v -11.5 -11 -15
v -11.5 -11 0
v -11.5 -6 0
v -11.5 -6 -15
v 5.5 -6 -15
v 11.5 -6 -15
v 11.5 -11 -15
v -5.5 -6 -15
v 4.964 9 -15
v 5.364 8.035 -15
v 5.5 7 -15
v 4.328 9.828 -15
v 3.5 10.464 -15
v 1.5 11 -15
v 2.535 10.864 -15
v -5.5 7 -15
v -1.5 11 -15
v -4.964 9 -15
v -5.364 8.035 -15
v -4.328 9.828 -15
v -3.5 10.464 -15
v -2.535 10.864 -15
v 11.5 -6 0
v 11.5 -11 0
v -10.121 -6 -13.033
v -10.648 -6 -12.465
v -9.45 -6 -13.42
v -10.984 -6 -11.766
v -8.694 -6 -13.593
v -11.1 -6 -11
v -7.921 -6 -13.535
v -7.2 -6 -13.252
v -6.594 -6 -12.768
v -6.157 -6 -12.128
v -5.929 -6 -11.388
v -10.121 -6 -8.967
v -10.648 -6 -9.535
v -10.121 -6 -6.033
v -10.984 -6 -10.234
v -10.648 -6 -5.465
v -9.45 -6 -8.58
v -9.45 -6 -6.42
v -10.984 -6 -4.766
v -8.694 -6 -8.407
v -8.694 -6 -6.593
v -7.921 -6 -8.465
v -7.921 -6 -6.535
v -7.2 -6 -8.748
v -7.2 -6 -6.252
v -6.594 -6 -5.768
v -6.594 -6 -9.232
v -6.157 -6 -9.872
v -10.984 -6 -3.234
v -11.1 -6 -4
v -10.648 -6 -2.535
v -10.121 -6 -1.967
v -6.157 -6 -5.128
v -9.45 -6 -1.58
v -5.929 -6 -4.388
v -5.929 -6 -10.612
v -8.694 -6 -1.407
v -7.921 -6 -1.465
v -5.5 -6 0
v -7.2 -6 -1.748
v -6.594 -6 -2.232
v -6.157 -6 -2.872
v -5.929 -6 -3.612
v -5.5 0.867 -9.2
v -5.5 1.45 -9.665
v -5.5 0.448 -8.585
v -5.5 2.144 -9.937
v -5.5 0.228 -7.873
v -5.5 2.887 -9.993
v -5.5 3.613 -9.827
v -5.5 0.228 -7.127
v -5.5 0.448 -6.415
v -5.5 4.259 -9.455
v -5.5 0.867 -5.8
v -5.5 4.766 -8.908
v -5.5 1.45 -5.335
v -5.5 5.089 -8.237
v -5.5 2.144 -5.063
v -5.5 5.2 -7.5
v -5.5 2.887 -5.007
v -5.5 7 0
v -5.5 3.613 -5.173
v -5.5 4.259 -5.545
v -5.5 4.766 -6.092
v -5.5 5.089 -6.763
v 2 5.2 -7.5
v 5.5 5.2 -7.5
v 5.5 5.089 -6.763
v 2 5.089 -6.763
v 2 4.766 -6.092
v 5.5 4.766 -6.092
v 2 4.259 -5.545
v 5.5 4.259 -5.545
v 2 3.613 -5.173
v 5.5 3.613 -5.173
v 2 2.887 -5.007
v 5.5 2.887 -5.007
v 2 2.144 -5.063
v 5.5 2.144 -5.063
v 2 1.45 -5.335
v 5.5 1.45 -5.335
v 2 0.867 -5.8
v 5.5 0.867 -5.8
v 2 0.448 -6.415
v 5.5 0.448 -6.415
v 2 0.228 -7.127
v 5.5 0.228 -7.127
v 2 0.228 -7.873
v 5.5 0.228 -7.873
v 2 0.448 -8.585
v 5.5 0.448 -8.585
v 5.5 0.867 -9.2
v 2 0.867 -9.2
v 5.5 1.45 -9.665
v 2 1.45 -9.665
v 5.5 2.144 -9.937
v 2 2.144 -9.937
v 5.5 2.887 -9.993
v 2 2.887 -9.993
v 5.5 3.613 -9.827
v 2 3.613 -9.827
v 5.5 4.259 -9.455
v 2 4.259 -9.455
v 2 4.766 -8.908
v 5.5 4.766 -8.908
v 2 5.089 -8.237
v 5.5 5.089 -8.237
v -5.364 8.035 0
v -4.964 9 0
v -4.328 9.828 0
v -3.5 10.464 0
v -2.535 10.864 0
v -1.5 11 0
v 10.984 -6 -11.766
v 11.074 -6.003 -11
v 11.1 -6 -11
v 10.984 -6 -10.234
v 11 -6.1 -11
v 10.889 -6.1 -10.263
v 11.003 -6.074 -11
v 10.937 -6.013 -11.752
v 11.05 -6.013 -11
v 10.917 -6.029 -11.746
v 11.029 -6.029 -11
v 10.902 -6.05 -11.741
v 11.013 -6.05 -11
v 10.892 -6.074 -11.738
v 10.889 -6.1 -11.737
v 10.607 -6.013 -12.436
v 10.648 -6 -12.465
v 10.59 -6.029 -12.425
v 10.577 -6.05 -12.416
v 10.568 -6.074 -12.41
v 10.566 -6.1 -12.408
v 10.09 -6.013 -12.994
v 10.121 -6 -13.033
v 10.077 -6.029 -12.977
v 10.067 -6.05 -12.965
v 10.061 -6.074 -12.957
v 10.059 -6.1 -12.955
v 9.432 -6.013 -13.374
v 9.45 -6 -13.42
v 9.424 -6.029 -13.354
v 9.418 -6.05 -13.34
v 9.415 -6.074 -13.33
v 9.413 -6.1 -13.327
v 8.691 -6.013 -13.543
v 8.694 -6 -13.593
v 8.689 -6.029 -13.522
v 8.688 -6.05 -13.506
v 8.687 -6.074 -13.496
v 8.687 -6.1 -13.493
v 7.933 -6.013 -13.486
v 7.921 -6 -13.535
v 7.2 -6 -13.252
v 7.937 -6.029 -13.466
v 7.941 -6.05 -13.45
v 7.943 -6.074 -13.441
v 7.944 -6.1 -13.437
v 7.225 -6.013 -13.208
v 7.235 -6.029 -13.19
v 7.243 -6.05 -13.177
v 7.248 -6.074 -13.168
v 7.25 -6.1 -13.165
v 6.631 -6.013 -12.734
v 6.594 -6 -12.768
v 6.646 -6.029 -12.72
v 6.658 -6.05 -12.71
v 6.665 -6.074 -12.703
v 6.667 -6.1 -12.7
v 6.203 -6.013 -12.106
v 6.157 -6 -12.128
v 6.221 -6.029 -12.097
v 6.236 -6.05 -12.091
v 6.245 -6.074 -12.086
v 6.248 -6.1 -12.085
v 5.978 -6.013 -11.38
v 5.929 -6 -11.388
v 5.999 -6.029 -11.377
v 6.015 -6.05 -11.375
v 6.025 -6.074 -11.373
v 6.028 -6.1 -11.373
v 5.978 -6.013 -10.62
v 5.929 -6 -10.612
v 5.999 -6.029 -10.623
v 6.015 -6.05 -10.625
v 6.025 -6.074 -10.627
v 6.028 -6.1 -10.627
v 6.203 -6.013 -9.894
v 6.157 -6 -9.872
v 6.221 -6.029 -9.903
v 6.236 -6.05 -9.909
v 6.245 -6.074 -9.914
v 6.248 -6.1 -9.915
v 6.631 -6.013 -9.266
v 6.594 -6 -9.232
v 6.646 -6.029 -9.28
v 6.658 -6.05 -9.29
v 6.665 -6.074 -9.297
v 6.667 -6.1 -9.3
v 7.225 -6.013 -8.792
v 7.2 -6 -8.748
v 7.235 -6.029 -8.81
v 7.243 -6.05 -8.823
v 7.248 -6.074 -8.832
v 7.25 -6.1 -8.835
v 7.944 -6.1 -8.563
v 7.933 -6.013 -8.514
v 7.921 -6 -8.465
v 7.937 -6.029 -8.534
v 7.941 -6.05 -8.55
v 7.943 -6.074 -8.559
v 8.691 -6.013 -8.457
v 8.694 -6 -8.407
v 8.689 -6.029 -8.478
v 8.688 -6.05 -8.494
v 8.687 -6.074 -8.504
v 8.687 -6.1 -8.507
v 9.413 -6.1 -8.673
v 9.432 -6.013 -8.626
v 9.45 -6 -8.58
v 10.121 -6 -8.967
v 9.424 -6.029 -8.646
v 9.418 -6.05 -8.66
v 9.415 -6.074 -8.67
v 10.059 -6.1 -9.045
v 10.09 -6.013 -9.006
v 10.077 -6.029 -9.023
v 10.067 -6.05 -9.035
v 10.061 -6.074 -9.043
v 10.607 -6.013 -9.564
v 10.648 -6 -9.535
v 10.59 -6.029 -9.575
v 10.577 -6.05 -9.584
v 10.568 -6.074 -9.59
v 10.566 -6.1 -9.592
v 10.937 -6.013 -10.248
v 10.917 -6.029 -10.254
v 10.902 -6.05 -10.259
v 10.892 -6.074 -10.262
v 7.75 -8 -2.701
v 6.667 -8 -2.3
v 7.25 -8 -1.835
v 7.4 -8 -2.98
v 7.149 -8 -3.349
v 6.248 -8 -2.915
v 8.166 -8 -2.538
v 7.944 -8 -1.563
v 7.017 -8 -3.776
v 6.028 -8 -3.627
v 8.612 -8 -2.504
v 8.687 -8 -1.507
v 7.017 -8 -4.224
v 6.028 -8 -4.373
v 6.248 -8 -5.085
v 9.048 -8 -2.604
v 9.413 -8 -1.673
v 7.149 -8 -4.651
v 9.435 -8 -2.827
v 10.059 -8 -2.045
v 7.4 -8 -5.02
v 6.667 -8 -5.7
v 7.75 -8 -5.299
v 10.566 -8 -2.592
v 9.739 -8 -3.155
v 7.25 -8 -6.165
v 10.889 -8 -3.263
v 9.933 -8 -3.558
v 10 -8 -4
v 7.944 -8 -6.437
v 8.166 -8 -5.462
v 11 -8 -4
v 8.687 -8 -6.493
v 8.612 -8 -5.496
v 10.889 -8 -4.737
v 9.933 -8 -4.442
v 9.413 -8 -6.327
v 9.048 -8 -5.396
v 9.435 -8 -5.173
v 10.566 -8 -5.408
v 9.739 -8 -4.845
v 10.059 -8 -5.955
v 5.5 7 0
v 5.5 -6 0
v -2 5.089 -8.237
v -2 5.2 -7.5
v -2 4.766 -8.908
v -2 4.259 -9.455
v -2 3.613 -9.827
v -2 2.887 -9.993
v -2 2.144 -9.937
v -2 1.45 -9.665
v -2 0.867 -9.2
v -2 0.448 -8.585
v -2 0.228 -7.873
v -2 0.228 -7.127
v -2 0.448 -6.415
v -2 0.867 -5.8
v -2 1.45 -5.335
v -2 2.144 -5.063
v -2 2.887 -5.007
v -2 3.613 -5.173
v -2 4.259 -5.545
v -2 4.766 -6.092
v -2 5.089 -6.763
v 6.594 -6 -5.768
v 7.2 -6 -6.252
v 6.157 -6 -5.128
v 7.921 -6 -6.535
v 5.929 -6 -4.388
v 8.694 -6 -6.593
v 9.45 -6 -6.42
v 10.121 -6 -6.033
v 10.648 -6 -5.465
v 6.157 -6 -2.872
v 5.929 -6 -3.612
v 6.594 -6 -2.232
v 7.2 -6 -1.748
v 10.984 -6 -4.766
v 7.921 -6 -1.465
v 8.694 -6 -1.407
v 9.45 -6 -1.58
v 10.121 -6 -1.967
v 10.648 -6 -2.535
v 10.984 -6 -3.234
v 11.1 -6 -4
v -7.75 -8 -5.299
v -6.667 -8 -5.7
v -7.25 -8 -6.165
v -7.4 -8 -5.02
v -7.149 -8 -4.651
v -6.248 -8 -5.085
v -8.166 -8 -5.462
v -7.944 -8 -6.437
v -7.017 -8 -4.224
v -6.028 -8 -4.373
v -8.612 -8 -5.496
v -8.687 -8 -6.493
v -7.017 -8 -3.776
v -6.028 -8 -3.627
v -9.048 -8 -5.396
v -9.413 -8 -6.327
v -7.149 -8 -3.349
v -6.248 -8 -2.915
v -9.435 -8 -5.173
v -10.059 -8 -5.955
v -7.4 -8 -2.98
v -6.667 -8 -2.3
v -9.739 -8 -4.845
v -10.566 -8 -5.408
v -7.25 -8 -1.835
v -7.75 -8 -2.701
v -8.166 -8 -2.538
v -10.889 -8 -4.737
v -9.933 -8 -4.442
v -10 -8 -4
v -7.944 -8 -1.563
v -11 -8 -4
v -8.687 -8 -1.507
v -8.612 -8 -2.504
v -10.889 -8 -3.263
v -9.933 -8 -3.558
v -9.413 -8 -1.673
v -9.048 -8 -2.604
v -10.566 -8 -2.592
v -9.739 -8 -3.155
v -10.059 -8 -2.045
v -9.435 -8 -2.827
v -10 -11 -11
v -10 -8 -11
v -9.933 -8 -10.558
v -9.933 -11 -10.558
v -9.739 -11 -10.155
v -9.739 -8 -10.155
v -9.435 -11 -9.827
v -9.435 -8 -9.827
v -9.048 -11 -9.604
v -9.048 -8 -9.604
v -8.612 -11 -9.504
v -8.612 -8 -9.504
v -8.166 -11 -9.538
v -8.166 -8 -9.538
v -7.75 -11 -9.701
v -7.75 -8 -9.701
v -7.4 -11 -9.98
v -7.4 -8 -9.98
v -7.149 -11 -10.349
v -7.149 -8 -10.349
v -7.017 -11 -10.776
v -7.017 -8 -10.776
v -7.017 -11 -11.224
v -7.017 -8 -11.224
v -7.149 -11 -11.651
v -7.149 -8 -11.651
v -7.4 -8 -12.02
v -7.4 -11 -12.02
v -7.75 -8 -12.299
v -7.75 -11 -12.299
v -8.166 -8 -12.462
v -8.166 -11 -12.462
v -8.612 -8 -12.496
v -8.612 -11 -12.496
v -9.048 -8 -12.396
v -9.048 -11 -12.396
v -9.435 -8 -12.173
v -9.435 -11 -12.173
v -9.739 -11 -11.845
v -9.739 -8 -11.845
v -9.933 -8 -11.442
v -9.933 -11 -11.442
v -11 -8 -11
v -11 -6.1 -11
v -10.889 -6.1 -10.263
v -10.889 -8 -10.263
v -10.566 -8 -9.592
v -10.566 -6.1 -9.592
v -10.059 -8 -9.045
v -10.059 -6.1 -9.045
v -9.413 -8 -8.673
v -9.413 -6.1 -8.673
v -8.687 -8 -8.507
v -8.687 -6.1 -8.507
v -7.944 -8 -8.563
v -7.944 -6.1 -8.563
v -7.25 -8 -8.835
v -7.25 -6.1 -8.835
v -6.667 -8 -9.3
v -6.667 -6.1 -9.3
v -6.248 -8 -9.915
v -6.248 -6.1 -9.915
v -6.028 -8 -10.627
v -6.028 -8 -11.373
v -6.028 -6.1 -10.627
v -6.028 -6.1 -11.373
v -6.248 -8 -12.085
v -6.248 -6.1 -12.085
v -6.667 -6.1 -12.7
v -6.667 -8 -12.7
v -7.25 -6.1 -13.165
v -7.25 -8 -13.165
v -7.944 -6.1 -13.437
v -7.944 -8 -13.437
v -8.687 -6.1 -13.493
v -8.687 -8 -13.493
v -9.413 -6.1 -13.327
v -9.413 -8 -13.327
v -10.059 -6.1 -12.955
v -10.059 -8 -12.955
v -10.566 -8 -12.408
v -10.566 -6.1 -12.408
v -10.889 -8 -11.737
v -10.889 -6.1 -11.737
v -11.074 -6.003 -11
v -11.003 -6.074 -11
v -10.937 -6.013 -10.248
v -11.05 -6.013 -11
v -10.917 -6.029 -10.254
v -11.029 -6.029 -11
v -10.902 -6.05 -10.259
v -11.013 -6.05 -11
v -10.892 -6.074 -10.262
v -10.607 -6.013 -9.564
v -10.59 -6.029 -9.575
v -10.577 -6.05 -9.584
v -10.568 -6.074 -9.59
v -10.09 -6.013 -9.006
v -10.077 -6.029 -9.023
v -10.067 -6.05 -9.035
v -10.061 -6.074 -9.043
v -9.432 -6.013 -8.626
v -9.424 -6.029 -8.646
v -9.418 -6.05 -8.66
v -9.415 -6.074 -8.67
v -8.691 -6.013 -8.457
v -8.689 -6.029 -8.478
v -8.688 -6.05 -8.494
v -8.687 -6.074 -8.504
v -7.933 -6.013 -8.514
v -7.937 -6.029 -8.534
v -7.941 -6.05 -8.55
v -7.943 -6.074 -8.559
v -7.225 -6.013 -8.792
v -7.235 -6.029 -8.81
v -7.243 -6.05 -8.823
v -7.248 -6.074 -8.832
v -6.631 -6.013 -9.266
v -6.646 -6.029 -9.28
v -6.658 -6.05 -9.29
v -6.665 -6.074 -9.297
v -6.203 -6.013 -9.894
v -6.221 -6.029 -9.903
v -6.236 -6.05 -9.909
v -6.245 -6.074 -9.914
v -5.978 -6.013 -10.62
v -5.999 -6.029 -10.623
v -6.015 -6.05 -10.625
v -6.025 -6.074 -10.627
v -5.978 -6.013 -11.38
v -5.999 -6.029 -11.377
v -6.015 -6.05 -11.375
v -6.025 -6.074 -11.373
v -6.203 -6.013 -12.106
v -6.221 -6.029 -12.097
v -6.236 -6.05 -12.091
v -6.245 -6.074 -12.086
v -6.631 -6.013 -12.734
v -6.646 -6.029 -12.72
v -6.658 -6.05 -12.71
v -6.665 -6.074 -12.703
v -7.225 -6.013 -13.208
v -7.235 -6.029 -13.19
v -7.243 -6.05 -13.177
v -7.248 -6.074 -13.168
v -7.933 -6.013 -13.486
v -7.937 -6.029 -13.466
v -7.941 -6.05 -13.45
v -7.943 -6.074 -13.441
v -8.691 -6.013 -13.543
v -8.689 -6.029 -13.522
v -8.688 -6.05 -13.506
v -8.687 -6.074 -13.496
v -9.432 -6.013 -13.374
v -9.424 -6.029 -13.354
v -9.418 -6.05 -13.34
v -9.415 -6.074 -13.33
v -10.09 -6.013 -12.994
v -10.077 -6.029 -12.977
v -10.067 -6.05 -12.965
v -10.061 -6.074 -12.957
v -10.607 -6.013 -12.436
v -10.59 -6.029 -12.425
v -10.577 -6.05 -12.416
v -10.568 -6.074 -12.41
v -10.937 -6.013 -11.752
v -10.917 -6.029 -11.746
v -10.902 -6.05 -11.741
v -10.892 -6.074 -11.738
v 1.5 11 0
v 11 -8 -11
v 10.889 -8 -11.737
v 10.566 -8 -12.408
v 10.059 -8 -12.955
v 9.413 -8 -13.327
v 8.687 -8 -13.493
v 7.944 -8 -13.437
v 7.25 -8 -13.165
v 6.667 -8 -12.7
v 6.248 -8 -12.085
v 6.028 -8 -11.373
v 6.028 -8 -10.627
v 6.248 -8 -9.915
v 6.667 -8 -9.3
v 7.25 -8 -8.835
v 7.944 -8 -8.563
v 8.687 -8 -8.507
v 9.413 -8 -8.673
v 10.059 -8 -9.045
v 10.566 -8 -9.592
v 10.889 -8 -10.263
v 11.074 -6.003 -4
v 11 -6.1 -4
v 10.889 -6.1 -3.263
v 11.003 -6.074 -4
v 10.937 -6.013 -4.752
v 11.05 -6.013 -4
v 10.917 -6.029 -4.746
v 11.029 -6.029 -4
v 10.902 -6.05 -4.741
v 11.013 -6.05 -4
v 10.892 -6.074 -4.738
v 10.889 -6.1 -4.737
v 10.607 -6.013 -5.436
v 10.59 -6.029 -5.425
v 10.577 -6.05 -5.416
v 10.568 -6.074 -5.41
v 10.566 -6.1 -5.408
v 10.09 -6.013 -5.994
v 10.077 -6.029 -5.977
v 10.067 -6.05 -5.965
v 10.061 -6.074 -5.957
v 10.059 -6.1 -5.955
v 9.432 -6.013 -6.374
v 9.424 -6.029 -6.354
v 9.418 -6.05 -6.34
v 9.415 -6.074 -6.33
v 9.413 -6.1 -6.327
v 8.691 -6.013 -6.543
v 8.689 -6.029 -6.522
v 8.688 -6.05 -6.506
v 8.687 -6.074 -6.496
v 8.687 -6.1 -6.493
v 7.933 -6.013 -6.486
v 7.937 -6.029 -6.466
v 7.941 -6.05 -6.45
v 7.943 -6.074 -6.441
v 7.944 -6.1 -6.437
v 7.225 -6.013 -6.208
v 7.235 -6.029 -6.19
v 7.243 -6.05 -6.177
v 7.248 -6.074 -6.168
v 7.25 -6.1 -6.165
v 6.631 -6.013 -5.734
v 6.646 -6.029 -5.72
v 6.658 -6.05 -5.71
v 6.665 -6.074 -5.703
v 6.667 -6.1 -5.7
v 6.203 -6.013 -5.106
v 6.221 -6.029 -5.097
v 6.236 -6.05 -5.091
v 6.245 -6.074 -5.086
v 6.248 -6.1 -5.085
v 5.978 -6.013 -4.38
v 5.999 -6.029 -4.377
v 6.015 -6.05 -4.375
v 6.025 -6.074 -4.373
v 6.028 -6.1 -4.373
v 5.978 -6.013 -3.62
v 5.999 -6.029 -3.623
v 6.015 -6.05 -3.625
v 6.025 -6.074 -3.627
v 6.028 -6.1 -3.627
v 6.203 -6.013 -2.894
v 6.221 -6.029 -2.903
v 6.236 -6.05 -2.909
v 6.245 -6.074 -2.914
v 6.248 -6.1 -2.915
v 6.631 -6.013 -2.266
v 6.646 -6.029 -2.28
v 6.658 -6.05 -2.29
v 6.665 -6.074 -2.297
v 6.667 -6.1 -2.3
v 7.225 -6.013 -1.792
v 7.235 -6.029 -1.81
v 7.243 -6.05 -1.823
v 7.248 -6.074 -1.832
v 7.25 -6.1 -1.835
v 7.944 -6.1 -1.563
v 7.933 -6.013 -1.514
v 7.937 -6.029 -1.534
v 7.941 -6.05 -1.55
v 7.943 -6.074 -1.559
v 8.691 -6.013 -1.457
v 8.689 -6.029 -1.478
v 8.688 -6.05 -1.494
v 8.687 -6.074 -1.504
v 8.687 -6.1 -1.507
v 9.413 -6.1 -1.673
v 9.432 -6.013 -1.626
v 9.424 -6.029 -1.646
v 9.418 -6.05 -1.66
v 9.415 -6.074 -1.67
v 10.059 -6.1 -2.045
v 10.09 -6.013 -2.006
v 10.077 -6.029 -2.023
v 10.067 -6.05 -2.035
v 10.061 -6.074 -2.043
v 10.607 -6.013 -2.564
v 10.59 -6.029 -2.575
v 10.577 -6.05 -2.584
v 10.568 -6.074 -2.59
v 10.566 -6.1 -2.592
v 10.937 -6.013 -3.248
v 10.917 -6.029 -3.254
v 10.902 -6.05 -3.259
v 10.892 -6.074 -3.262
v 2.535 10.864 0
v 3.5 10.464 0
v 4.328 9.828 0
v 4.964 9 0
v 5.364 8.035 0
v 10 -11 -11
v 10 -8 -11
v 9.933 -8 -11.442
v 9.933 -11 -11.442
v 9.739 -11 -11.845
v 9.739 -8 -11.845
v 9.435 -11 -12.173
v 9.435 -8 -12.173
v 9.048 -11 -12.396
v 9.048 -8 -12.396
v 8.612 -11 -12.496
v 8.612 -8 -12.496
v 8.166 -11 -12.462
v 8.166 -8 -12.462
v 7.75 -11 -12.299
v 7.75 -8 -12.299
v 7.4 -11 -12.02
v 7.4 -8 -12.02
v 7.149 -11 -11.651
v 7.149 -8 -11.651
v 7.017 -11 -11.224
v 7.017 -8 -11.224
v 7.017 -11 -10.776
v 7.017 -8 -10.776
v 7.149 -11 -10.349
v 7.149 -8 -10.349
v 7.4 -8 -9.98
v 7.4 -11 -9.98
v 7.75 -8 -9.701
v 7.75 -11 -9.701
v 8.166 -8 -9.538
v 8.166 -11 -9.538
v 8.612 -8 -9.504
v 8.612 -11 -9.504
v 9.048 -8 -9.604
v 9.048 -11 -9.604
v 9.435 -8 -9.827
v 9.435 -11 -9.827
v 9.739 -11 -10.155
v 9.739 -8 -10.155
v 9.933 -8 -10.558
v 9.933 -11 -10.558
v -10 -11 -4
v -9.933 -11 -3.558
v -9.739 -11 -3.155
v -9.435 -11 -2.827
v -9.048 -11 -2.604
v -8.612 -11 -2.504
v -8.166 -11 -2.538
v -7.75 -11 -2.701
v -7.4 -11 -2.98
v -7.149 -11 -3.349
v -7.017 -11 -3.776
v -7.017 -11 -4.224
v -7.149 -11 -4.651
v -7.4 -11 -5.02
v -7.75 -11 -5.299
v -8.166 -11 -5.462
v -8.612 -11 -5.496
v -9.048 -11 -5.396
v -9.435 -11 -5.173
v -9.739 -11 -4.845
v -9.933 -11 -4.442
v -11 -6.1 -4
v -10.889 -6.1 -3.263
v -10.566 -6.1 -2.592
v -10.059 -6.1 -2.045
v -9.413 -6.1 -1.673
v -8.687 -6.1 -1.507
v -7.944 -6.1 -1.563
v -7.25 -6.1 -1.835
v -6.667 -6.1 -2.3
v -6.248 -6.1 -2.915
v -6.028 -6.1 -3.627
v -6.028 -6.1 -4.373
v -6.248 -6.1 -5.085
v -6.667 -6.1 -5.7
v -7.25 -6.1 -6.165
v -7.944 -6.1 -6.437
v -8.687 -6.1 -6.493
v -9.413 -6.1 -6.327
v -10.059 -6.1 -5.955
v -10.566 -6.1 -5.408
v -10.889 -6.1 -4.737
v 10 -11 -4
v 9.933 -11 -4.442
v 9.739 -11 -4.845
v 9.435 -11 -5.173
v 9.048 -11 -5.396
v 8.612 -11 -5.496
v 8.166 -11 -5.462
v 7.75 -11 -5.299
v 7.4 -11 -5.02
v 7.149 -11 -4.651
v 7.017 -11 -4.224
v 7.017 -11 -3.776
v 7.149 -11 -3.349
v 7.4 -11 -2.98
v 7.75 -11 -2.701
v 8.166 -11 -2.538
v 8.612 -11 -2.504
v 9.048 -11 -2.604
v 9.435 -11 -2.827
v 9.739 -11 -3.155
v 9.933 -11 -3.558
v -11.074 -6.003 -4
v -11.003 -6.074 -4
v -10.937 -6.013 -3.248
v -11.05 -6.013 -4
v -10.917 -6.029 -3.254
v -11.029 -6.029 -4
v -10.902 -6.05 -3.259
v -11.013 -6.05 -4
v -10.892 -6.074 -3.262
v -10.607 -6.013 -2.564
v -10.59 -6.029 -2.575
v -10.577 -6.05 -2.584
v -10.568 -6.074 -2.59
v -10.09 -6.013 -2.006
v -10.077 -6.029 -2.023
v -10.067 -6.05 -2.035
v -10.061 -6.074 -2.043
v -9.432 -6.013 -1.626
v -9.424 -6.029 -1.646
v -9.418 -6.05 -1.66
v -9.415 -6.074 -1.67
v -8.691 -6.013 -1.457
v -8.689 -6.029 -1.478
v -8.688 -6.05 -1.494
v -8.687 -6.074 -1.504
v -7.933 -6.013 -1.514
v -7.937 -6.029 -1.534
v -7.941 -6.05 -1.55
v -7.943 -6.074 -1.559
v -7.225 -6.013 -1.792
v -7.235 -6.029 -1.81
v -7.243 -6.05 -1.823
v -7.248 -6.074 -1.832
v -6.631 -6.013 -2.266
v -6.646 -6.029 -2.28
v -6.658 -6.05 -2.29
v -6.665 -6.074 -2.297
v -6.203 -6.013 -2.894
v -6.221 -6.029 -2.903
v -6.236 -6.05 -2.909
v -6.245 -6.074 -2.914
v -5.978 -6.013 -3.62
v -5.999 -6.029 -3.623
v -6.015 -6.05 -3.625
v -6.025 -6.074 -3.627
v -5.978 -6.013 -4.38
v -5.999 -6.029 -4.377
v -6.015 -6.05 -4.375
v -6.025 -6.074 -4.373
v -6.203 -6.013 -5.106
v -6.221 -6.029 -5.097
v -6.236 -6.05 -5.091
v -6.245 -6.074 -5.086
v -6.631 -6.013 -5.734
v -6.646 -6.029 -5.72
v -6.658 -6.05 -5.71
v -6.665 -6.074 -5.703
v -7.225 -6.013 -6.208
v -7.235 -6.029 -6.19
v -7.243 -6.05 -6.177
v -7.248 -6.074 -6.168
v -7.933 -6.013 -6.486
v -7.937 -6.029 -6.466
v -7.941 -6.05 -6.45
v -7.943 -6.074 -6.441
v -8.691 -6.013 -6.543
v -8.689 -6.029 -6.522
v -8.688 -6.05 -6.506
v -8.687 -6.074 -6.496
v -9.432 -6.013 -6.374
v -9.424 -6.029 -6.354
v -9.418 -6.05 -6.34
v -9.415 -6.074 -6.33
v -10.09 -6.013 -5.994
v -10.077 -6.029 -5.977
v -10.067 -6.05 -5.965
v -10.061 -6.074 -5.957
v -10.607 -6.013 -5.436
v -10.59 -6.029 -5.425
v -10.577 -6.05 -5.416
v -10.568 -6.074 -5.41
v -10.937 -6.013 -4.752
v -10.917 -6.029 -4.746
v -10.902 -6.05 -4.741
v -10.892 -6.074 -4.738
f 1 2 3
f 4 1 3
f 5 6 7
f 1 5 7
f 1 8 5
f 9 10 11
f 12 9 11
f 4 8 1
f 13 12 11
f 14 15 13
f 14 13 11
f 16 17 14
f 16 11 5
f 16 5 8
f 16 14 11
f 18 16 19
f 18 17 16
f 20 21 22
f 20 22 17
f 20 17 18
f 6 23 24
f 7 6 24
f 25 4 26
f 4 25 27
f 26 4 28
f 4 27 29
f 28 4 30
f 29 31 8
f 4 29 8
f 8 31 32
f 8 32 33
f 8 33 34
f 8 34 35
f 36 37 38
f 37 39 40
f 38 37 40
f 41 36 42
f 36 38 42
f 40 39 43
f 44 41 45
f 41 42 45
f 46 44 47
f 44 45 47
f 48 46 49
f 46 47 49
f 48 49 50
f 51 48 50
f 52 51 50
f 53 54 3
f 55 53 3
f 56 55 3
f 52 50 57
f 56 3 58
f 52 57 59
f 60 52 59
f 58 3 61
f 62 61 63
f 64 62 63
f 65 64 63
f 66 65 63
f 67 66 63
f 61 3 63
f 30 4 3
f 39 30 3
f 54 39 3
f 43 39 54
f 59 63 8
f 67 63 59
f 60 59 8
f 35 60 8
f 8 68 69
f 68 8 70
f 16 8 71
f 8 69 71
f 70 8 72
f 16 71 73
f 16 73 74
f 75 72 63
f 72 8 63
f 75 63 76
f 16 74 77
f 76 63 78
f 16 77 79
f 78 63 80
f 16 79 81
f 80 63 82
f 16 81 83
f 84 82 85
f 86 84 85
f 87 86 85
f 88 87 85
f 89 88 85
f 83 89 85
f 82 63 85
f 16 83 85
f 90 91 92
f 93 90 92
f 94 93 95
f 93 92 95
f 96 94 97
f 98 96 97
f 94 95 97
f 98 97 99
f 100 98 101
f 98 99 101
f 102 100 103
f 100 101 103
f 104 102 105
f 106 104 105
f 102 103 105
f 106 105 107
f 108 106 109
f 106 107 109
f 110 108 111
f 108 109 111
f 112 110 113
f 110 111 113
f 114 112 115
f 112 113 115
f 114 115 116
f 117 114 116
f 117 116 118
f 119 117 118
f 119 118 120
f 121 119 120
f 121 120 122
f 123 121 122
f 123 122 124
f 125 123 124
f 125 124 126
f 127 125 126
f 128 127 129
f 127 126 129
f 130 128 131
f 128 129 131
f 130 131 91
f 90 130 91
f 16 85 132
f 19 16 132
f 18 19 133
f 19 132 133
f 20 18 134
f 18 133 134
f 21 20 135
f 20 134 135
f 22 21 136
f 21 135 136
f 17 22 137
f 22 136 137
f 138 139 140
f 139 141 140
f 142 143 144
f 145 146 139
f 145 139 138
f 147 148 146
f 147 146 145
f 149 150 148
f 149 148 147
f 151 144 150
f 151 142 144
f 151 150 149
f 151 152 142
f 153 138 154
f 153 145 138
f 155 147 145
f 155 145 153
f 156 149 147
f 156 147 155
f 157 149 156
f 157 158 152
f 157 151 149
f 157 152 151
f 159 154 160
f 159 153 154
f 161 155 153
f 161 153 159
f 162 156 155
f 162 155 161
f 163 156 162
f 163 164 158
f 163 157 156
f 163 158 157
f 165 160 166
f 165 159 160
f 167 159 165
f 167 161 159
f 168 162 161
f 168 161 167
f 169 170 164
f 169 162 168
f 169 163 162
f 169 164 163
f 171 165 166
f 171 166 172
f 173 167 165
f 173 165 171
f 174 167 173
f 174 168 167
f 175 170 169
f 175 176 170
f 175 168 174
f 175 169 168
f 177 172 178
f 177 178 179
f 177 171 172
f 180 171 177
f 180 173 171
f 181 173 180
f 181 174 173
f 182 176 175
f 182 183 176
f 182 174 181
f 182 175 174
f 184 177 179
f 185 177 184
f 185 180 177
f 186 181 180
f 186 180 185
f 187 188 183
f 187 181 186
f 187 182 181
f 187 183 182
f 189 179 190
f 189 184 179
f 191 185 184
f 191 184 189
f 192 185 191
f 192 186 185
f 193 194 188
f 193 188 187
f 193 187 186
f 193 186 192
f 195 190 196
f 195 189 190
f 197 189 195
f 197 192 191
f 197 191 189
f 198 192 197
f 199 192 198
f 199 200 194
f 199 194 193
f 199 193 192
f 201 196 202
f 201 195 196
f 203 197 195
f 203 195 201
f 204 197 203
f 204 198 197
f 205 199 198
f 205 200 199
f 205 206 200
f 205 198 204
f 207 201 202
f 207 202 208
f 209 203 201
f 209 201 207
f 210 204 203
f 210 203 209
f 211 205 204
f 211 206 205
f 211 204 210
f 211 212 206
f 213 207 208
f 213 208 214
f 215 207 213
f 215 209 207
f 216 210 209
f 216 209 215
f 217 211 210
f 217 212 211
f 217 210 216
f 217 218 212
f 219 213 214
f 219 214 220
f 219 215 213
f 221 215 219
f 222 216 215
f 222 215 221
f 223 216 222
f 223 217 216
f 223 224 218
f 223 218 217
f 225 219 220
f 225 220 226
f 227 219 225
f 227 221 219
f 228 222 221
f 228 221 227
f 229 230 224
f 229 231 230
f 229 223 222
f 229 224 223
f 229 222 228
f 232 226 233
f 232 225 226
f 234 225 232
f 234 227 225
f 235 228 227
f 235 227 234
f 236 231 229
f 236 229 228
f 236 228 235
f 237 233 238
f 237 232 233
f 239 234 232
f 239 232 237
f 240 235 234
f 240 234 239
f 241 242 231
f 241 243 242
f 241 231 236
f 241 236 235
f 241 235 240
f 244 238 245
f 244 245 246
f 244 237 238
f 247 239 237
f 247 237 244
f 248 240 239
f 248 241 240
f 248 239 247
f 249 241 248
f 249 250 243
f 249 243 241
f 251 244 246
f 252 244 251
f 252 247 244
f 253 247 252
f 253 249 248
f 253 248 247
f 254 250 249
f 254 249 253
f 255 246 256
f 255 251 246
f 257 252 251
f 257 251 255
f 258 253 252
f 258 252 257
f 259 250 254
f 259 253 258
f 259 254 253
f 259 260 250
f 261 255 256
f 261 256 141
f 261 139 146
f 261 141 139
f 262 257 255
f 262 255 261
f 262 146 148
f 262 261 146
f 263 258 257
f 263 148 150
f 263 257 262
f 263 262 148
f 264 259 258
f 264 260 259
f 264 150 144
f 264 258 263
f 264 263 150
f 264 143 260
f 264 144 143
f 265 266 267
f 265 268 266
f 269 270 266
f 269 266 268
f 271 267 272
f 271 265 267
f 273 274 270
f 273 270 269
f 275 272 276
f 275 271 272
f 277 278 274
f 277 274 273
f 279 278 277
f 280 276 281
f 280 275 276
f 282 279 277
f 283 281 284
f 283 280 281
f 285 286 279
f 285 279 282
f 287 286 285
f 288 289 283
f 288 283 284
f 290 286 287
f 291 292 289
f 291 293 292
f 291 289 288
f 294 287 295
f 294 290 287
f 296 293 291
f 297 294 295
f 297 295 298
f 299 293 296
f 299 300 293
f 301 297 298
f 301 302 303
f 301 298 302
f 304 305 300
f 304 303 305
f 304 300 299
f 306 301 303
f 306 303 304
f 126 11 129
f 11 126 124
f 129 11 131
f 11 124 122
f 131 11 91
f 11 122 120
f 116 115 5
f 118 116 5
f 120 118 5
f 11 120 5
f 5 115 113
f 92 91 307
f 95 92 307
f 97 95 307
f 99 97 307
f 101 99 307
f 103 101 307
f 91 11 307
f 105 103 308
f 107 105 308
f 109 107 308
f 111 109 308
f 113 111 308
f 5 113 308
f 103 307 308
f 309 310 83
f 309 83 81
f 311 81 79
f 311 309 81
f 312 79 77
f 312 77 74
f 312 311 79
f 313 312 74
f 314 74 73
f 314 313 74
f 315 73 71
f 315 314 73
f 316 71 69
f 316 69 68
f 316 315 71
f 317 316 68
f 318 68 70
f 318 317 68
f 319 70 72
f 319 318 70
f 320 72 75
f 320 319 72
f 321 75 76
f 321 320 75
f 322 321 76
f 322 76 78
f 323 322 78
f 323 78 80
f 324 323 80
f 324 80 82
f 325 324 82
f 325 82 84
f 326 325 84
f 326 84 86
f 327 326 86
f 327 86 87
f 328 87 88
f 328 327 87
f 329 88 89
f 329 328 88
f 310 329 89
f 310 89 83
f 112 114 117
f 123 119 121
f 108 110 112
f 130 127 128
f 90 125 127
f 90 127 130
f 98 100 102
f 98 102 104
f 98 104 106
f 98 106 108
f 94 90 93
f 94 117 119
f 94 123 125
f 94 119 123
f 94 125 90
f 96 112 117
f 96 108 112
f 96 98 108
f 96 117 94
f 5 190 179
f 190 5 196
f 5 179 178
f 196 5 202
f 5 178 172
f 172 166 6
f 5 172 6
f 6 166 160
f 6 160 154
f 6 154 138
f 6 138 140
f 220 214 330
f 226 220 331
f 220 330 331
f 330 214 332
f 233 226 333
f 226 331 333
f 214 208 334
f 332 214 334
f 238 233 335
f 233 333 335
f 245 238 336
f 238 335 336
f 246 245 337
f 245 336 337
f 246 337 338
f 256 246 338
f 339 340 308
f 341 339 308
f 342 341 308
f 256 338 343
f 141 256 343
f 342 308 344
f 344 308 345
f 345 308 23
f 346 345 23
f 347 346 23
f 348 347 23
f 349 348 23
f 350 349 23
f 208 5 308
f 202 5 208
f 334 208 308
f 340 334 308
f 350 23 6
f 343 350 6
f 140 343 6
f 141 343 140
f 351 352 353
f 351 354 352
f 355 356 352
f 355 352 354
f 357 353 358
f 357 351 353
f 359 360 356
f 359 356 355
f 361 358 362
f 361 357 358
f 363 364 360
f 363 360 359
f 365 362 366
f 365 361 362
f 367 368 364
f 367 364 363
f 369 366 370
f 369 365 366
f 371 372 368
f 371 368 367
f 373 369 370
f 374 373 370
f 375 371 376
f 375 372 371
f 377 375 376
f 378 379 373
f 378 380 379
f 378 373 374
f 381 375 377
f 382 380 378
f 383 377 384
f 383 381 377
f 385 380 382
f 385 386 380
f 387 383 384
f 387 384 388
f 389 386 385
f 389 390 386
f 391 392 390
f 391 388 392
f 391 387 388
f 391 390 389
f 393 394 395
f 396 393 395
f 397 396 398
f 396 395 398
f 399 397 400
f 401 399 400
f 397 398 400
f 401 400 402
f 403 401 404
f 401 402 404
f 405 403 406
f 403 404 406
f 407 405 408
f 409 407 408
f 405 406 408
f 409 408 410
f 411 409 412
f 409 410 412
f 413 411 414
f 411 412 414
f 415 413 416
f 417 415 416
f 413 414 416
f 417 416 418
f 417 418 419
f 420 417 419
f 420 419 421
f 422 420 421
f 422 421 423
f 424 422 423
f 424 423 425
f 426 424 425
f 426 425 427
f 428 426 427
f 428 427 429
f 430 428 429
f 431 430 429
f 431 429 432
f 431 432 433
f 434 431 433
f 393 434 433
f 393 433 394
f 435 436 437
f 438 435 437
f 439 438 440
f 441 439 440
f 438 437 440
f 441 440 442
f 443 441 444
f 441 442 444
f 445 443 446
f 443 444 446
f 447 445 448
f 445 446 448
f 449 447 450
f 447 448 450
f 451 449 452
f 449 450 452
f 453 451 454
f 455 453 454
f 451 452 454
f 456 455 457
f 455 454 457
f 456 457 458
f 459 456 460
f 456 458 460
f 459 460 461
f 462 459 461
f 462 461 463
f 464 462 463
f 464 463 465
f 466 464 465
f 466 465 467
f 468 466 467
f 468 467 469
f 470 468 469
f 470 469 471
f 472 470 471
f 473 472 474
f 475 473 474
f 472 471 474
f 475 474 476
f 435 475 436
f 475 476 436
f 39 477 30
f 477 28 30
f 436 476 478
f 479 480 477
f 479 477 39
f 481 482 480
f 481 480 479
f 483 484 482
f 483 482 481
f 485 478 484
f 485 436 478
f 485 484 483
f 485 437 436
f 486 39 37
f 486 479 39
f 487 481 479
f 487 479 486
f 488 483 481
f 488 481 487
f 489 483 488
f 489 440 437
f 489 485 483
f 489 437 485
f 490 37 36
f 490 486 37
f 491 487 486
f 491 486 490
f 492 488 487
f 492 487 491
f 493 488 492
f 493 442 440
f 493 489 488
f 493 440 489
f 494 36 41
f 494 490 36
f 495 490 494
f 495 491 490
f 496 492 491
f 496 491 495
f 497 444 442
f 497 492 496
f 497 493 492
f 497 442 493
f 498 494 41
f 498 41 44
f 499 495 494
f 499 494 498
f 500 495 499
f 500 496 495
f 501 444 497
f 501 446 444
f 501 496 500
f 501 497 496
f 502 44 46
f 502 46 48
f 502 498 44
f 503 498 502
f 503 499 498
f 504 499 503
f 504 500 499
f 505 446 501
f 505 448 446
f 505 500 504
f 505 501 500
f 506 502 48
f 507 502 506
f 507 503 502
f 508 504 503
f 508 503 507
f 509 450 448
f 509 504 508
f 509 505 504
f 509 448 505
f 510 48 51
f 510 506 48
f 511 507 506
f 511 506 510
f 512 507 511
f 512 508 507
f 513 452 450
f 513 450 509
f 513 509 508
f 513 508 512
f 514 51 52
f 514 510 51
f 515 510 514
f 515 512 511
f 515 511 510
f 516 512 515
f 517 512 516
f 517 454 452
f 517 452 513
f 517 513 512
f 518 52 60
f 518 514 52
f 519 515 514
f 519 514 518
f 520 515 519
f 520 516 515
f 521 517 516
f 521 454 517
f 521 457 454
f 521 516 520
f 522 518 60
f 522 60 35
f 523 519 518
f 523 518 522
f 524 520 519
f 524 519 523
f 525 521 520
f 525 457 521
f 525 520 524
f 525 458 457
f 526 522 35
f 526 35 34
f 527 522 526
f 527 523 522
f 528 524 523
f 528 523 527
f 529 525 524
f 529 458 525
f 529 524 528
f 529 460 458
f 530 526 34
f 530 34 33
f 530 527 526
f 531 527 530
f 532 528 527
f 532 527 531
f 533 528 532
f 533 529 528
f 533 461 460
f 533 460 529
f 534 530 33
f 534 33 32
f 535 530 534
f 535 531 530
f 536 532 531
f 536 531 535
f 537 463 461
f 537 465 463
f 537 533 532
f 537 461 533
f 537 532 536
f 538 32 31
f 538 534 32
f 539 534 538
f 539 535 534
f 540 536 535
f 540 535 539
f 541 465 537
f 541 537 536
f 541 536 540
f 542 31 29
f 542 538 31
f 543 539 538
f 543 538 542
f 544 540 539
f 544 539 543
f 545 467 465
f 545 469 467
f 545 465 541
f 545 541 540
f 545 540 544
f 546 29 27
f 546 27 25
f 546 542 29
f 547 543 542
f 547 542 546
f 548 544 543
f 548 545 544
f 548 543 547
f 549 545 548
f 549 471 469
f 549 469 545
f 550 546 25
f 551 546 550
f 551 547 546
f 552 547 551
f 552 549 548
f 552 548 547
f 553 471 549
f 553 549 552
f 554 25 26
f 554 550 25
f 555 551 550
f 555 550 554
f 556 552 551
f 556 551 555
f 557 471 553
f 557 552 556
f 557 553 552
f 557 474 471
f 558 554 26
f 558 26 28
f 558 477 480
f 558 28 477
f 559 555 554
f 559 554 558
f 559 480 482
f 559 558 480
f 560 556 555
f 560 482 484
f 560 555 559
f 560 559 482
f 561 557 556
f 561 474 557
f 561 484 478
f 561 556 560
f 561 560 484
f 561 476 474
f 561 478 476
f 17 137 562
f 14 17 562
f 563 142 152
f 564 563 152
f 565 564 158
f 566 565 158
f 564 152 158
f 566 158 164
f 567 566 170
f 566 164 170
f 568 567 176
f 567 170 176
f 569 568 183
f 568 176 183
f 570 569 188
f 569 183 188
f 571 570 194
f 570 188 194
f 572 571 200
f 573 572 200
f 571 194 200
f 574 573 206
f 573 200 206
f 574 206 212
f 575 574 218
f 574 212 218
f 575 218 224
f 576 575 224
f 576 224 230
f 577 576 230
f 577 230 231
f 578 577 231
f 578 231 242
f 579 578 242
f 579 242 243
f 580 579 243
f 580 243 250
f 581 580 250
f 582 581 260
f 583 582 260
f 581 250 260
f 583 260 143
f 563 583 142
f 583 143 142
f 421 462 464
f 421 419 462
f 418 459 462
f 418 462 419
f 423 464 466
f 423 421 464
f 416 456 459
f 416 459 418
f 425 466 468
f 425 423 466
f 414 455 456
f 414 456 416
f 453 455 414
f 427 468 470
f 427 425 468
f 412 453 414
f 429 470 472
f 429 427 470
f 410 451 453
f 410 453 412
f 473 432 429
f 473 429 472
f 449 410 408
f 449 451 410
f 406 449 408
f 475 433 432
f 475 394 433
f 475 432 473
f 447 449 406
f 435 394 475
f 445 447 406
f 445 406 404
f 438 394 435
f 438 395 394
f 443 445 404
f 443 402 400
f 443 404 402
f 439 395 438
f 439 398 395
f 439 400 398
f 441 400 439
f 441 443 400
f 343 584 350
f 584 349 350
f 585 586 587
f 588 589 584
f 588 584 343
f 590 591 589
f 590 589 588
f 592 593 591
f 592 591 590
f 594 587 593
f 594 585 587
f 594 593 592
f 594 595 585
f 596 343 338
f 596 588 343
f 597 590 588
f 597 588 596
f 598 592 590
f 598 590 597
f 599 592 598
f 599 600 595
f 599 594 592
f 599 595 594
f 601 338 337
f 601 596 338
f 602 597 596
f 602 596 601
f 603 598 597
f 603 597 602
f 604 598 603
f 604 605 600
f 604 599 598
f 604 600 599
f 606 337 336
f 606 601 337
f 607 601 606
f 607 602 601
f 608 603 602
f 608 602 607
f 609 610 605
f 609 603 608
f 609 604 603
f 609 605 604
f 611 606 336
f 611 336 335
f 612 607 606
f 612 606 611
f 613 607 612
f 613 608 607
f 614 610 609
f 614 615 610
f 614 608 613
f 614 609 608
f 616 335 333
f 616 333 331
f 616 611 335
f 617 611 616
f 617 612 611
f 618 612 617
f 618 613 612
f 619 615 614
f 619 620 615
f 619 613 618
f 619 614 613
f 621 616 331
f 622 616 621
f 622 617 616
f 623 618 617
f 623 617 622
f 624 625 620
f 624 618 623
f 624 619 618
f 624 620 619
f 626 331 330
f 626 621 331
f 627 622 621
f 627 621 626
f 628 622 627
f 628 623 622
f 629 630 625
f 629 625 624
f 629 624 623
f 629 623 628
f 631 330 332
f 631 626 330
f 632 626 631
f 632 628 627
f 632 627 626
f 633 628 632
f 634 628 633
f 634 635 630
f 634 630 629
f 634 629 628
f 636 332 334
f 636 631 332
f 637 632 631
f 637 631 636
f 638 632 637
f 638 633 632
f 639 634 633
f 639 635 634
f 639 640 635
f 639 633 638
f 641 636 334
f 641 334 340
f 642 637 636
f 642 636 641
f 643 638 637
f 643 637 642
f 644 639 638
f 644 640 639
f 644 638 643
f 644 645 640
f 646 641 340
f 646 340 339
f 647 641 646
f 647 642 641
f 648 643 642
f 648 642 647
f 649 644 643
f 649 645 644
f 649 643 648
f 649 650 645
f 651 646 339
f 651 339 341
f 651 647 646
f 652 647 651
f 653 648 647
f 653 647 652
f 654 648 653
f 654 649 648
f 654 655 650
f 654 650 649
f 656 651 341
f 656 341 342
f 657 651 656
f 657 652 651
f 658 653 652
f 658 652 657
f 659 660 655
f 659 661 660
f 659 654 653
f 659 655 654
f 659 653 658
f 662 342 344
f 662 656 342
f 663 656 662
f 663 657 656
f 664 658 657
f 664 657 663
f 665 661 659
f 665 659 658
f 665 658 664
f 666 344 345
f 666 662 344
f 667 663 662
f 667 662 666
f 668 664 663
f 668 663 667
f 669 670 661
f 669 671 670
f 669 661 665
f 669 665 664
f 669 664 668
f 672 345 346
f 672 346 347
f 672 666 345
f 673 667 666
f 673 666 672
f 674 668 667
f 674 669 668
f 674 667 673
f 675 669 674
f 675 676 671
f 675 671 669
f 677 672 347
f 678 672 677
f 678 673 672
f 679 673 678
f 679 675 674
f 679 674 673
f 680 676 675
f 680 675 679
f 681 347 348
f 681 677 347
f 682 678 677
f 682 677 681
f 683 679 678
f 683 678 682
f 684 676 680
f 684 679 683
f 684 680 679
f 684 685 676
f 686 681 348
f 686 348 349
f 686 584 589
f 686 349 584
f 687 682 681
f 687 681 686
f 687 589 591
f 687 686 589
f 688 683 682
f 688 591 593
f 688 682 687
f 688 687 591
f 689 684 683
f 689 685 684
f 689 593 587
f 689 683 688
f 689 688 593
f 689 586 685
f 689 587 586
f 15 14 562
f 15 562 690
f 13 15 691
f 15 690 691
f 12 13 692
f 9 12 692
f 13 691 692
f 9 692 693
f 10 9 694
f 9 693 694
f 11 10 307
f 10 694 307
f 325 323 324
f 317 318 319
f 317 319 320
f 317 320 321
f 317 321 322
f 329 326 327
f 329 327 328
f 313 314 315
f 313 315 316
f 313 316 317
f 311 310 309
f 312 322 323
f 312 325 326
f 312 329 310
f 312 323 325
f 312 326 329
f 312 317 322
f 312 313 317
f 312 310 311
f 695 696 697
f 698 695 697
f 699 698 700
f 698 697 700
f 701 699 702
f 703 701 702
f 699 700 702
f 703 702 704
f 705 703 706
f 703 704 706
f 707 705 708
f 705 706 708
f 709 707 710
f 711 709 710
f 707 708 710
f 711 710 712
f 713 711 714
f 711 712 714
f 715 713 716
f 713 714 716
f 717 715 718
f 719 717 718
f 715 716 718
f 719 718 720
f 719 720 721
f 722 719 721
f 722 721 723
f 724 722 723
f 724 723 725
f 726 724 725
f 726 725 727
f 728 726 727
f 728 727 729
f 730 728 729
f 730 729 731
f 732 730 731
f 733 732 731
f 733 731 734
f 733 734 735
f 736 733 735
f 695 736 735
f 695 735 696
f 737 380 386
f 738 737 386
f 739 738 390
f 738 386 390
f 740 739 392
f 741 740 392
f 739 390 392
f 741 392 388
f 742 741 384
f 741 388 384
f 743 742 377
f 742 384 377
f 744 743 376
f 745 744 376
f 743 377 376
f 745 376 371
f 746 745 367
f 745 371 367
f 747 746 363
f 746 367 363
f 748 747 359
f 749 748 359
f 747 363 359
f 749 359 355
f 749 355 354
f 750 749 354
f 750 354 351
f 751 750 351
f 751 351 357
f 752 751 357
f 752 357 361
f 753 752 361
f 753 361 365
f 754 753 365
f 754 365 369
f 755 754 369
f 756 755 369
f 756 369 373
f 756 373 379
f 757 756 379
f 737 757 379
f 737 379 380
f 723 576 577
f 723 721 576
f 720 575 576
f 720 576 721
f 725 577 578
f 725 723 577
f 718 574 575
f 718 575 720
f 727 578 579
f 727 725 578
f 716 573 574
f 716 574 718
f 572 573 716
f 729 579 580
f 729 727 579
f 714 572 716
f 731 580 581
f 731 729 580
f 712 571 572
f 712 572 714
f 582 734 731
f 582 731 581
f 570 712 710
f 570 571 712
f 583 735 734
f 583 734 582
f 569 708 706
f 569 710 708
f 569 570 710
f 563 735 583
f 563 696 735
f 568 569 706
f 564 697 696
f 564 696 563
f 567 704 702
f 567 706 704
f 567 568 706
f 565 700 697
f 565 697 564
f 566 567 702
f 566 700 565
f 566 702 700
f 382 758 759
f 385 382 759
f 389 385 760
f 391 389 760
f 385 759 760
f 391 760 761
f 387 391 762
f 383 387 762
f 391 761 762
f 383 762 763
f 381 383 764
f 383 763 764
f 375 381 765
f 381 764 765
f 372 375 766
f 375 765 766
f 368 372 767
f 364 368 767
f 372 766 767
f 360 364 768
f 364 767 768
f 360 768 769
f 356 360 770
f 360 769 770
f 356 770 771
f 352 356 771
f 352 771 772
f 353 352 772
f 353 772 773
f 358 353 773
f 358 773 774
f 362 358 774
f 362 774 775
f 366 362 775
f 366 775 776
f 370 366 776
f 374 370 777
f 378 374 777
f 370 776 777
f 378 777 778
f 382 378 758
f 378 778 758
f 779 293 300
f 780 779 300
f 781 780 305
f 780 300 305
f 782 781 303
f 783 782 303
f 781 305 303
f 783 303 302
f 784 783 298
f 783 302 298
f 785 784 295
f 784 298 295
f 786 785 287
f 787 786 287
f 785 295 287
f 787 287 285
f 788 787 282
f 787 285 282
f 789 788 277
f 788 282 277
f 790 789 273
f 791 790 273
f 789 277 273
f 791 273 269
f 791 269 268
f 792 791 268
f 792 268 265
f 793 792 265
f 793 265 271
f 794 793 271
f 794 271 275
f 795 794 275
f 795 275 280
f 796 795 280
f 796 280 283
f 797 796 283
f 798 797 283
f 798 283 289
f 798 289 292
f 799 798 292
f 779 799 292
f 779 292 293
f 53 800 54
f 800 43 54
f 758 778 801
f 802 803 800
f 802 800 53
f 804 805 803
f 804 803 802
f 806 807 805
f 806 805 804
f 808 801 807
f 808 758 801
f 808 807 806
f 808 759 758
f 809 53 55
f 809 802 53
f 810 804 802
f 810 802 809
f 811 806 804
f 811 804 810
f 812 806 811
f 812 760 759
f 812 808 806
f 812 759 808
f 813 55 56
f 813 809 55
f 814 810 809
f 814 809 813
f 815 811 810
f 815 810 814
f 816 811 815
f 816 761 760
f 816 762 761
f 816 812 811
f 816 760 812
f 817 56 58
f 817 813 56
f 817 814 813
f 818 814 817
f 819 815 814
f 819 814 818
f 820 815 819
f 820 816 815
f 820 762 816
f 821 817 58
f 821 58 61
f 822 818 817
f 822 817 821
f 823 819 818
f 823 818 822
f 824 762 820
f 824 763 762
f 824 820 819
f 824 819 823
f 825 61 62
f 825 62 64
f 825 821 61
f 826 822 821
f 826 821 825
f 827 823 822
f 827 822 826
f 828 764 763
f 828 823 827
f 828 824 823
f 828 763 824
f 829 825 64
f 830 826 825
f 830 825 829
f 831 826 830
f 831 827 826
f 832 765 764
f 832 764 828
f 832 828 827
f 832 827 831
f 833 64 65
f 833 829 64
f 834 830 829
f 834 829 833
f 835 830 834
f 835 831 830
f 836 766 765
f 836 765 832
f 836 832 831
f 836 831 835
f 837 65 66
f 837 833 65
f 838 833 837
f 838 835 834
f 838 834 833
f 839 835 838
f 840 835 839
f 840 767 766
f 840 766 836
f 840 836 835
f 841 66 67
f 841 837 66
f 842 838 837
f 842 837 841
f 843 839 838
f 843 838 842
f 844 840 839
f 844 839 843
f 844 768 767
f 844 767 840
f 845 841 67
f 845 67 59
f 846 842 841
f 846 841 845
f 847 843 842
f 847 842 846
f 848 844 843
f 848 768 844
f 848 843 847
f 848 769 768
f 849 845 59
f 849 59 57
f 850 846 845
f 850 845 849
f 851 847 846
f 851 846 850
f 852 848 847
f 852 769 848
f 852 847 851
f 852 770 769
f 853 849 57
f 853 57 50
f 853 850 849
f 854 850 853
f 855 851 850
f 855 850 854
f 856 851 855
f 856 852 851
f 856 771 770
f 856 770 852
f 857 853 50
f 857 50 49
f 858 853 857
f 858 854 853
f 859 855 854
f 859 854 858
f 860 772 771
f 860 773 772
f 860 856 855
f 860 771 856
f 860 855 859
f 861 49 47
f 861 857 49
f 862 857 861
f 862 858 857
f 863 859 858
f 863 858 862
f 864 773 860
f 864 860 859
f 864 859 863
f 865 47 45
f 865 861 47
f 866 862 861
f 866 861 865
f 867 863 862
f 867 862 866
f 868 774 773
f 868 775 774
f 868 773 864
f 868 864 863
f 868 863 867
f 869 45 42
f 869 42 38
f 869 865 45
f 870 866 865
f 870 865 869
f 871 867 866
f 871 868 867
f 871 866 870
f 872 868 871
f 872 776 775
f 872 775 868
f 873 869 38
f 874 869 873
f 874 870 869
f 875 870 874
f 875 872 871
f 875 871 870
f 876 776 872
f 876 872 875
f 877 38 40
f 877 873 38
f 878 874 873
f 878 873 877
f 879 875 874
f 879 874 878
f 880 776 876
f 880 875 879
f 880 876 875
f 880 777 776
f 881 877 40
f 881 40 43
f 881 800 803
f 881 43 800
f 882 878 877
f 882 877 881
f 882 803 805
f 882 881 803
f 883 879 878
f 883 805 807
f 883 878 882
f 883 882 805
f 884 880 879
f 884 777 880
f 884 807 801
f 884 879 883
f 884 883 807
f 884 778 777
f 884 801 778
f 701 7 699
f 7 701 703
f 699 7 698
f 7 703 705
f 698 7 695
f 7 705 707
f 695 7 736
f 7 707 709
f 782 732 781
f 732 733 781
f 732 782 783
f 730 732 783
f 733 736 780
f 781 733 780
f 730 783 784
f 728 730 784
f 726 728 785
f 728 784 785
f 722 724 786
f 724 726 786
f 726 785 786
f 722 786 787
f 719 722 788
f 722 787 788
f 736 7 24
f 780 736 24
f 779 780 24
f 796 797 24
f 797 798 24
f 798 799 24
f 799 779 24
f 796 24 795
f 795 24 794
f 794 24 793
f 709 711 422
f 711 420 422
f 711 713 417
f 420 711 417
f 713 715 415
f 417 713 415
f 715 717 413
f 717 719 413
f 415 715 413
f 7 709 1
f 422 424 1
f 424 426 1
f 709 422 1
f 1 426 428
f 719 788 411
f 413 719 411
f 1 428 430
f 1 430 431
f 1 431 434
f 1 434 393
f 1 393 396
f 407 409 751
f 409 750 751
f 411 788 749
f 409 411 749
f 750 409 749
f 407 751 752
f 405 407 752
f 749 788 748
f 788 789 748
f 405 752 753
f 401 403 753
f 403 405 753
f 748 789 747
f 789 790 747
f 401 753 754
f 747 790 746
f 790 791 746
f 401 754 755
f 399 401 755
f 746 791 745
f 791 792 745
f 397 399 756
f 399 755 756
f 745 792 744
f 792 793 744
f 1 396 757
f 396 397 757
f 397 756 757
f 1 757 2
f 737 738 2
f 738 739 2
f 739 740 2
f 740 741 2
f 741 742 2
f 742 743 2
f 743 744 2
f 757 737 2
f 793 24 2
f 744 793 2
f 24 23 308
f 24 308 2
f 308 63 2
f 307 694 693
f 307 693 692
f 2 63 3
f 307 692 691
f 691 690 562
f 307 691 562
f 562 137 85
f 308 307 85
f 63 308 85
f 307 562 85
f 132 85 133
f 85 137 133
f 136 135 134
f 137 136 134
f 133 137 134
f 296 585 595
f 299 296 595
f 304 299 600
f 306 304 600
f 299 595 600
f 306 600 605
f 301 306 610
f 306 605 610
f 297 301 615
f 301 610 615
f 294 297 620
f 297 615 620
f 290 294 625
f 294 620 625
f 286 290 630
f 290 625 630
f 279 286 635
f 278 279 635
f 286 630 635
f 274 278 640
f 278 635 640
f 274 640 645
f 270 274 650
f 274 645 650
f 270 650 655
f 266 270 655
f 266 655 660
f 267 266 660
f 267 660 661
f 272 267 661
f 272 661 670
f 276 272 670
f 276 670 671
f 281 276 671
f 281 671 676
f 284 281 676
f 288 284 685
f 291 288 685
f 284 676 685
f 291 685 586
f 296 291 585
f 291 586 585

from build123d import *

# Parameters (mm, degrees)
SALIENTE_EXTRUIR1_DEPTH = 15
CROQUIS2_R              = 2.5
CORTAR_EXTRUIR1_DEPTH   = 3.5
CORTAR_EXTRUIR2_START   = -3.5
CROQUIS3_R              = 2.5
CORTAR_EXTRUIR2_DEPTH   = 3.5
CROQUIS4_R              = 2.5
CORTAR_EXTRUIR3_DEPTH   = 2
REDONDEO1_R             = 0.1
CROQUIS5_R              = 1.5
CORTAR_EXTRUIR4_DEPTH   = 26.421447638


with BuildPart() as part:
    # Croquis1 → Saliente-Extruir1 (new body)
    with BuildSketch(Plane.XY):
        with BuildLine():
            Line((-1.5, 11), (1.5, 11))
            ThreePointArc((1.5, 11), (4.328427125, 9.828427125), (5.5, 7))
            Line((5.5, 7), (5.5, -6))
            Line((5.5, -6), (11.5, -6))
            Line((11.5, -6), (11.5, -11))
            Line((11.5, -11), (5.5, -11))
            Line((5.5, -11), (-5.5, -11))
            Line((-5.5, -11), (-11.5, -11))
            Line((-11.5, -11), (-11.5, -6))
            Line((-11.5, -6), (-5.5, -6))
            Line((-5.5, -6), (-5.5, 7))
            ThreePointArc((-5.5, 7), (-4.328427125, 9.828427125), (-1.5, 11))
        make_face()
    extrude(amount=-SALIENTE_EXTRUIR1_DEPTH)

    # Croquis2 → Cortar-Extruir1 (cut)
    with BuildSketch(Plane(origin=(5.5, 0, 0), x_dir=(0, 0, -1), z_dir=(1, 0, 0))):
        with Locations(Location((7.5, 2.7, 0), (0, 0, 90))):
            Circle(CROQUIS2_R)
    extrude(amount=-CORTAR_EXTRUIR1_DEPTH, mode=Mode.SUBTRACT)

    # Croquis3 → Cortar-Extruir2 (cut)
    with BuildSketch(Plane.ZY.offset(5.5).offset(CORTAR_EXTRUIR2_START)):
        with Locations(Location((-7.5, 2.7, 0), (0, 0, 90))):
            Circle(CROQUIS3_R)
    extrude(amount=CORTAR_EXTRUIR2_DEPTH, mode=Mode.SUBTRACT)

    # Croquis4 → Cortar-Extruir3 (cut)
    with BuildSketch(Plane(origin=(0, -6, 0), x_dir=(1, 0, 0), z_dir=(0, 1, 0))):
        with Locations(Location((-8.5, 11, 0), (0, 0, 180))):
            Circle(CROQUIS4_R)
        with Locations(Location((-8.5, 4, 0), (0, 0, 180))):
            Circle(CROQUIS4_R)
        with Locations((8.5, 4)):
            Circle(CROQUIS4_R)
        with Locations((8.5, 11)):
            Circle(CROQUIS4_R)
    extrude(amount=-CORTAR_EXTRUIR3_DEPTH, mode=Mode.SUBTRACT)

    # Redondeo1
    redondeo1_edges = [part.edges().sort_by_distance(p)[0] for p in [
        (6, -6, -11),
        (6, -6, -4),
        (-6, -6, -4),
        (-6, -6, -11),
    ]]
    fillet(redondeo1_edges, radius=REDONDEO1_R)

    # Croquis5 → Cortar-Extruir4 (cut, through all)
    with BuildSketch(Plane(origin=(0, -6, 0), x_dir=(1, 0, 0), z_dir=(0, 1, 0))):
        with Locations(Location((-8.5, 11, 0), (0, 0, 180))):
            Circle(CROQUIS5_R)
        with Locations(Location((-8.5, 4, 0), (0, 0, 180))):
            Circle(CROQUIS5_R)
        with Locations((8.5, 4)):
            Circle(CROQUIS5_R)
        with Locations((8.5, 11)):
            Circle(CROQUIS5_R)
    extrude(amount=-CORTAR_EXTRUIR4_DEPTH, mode=Mode.SUBTRACT)


solid = part.part
